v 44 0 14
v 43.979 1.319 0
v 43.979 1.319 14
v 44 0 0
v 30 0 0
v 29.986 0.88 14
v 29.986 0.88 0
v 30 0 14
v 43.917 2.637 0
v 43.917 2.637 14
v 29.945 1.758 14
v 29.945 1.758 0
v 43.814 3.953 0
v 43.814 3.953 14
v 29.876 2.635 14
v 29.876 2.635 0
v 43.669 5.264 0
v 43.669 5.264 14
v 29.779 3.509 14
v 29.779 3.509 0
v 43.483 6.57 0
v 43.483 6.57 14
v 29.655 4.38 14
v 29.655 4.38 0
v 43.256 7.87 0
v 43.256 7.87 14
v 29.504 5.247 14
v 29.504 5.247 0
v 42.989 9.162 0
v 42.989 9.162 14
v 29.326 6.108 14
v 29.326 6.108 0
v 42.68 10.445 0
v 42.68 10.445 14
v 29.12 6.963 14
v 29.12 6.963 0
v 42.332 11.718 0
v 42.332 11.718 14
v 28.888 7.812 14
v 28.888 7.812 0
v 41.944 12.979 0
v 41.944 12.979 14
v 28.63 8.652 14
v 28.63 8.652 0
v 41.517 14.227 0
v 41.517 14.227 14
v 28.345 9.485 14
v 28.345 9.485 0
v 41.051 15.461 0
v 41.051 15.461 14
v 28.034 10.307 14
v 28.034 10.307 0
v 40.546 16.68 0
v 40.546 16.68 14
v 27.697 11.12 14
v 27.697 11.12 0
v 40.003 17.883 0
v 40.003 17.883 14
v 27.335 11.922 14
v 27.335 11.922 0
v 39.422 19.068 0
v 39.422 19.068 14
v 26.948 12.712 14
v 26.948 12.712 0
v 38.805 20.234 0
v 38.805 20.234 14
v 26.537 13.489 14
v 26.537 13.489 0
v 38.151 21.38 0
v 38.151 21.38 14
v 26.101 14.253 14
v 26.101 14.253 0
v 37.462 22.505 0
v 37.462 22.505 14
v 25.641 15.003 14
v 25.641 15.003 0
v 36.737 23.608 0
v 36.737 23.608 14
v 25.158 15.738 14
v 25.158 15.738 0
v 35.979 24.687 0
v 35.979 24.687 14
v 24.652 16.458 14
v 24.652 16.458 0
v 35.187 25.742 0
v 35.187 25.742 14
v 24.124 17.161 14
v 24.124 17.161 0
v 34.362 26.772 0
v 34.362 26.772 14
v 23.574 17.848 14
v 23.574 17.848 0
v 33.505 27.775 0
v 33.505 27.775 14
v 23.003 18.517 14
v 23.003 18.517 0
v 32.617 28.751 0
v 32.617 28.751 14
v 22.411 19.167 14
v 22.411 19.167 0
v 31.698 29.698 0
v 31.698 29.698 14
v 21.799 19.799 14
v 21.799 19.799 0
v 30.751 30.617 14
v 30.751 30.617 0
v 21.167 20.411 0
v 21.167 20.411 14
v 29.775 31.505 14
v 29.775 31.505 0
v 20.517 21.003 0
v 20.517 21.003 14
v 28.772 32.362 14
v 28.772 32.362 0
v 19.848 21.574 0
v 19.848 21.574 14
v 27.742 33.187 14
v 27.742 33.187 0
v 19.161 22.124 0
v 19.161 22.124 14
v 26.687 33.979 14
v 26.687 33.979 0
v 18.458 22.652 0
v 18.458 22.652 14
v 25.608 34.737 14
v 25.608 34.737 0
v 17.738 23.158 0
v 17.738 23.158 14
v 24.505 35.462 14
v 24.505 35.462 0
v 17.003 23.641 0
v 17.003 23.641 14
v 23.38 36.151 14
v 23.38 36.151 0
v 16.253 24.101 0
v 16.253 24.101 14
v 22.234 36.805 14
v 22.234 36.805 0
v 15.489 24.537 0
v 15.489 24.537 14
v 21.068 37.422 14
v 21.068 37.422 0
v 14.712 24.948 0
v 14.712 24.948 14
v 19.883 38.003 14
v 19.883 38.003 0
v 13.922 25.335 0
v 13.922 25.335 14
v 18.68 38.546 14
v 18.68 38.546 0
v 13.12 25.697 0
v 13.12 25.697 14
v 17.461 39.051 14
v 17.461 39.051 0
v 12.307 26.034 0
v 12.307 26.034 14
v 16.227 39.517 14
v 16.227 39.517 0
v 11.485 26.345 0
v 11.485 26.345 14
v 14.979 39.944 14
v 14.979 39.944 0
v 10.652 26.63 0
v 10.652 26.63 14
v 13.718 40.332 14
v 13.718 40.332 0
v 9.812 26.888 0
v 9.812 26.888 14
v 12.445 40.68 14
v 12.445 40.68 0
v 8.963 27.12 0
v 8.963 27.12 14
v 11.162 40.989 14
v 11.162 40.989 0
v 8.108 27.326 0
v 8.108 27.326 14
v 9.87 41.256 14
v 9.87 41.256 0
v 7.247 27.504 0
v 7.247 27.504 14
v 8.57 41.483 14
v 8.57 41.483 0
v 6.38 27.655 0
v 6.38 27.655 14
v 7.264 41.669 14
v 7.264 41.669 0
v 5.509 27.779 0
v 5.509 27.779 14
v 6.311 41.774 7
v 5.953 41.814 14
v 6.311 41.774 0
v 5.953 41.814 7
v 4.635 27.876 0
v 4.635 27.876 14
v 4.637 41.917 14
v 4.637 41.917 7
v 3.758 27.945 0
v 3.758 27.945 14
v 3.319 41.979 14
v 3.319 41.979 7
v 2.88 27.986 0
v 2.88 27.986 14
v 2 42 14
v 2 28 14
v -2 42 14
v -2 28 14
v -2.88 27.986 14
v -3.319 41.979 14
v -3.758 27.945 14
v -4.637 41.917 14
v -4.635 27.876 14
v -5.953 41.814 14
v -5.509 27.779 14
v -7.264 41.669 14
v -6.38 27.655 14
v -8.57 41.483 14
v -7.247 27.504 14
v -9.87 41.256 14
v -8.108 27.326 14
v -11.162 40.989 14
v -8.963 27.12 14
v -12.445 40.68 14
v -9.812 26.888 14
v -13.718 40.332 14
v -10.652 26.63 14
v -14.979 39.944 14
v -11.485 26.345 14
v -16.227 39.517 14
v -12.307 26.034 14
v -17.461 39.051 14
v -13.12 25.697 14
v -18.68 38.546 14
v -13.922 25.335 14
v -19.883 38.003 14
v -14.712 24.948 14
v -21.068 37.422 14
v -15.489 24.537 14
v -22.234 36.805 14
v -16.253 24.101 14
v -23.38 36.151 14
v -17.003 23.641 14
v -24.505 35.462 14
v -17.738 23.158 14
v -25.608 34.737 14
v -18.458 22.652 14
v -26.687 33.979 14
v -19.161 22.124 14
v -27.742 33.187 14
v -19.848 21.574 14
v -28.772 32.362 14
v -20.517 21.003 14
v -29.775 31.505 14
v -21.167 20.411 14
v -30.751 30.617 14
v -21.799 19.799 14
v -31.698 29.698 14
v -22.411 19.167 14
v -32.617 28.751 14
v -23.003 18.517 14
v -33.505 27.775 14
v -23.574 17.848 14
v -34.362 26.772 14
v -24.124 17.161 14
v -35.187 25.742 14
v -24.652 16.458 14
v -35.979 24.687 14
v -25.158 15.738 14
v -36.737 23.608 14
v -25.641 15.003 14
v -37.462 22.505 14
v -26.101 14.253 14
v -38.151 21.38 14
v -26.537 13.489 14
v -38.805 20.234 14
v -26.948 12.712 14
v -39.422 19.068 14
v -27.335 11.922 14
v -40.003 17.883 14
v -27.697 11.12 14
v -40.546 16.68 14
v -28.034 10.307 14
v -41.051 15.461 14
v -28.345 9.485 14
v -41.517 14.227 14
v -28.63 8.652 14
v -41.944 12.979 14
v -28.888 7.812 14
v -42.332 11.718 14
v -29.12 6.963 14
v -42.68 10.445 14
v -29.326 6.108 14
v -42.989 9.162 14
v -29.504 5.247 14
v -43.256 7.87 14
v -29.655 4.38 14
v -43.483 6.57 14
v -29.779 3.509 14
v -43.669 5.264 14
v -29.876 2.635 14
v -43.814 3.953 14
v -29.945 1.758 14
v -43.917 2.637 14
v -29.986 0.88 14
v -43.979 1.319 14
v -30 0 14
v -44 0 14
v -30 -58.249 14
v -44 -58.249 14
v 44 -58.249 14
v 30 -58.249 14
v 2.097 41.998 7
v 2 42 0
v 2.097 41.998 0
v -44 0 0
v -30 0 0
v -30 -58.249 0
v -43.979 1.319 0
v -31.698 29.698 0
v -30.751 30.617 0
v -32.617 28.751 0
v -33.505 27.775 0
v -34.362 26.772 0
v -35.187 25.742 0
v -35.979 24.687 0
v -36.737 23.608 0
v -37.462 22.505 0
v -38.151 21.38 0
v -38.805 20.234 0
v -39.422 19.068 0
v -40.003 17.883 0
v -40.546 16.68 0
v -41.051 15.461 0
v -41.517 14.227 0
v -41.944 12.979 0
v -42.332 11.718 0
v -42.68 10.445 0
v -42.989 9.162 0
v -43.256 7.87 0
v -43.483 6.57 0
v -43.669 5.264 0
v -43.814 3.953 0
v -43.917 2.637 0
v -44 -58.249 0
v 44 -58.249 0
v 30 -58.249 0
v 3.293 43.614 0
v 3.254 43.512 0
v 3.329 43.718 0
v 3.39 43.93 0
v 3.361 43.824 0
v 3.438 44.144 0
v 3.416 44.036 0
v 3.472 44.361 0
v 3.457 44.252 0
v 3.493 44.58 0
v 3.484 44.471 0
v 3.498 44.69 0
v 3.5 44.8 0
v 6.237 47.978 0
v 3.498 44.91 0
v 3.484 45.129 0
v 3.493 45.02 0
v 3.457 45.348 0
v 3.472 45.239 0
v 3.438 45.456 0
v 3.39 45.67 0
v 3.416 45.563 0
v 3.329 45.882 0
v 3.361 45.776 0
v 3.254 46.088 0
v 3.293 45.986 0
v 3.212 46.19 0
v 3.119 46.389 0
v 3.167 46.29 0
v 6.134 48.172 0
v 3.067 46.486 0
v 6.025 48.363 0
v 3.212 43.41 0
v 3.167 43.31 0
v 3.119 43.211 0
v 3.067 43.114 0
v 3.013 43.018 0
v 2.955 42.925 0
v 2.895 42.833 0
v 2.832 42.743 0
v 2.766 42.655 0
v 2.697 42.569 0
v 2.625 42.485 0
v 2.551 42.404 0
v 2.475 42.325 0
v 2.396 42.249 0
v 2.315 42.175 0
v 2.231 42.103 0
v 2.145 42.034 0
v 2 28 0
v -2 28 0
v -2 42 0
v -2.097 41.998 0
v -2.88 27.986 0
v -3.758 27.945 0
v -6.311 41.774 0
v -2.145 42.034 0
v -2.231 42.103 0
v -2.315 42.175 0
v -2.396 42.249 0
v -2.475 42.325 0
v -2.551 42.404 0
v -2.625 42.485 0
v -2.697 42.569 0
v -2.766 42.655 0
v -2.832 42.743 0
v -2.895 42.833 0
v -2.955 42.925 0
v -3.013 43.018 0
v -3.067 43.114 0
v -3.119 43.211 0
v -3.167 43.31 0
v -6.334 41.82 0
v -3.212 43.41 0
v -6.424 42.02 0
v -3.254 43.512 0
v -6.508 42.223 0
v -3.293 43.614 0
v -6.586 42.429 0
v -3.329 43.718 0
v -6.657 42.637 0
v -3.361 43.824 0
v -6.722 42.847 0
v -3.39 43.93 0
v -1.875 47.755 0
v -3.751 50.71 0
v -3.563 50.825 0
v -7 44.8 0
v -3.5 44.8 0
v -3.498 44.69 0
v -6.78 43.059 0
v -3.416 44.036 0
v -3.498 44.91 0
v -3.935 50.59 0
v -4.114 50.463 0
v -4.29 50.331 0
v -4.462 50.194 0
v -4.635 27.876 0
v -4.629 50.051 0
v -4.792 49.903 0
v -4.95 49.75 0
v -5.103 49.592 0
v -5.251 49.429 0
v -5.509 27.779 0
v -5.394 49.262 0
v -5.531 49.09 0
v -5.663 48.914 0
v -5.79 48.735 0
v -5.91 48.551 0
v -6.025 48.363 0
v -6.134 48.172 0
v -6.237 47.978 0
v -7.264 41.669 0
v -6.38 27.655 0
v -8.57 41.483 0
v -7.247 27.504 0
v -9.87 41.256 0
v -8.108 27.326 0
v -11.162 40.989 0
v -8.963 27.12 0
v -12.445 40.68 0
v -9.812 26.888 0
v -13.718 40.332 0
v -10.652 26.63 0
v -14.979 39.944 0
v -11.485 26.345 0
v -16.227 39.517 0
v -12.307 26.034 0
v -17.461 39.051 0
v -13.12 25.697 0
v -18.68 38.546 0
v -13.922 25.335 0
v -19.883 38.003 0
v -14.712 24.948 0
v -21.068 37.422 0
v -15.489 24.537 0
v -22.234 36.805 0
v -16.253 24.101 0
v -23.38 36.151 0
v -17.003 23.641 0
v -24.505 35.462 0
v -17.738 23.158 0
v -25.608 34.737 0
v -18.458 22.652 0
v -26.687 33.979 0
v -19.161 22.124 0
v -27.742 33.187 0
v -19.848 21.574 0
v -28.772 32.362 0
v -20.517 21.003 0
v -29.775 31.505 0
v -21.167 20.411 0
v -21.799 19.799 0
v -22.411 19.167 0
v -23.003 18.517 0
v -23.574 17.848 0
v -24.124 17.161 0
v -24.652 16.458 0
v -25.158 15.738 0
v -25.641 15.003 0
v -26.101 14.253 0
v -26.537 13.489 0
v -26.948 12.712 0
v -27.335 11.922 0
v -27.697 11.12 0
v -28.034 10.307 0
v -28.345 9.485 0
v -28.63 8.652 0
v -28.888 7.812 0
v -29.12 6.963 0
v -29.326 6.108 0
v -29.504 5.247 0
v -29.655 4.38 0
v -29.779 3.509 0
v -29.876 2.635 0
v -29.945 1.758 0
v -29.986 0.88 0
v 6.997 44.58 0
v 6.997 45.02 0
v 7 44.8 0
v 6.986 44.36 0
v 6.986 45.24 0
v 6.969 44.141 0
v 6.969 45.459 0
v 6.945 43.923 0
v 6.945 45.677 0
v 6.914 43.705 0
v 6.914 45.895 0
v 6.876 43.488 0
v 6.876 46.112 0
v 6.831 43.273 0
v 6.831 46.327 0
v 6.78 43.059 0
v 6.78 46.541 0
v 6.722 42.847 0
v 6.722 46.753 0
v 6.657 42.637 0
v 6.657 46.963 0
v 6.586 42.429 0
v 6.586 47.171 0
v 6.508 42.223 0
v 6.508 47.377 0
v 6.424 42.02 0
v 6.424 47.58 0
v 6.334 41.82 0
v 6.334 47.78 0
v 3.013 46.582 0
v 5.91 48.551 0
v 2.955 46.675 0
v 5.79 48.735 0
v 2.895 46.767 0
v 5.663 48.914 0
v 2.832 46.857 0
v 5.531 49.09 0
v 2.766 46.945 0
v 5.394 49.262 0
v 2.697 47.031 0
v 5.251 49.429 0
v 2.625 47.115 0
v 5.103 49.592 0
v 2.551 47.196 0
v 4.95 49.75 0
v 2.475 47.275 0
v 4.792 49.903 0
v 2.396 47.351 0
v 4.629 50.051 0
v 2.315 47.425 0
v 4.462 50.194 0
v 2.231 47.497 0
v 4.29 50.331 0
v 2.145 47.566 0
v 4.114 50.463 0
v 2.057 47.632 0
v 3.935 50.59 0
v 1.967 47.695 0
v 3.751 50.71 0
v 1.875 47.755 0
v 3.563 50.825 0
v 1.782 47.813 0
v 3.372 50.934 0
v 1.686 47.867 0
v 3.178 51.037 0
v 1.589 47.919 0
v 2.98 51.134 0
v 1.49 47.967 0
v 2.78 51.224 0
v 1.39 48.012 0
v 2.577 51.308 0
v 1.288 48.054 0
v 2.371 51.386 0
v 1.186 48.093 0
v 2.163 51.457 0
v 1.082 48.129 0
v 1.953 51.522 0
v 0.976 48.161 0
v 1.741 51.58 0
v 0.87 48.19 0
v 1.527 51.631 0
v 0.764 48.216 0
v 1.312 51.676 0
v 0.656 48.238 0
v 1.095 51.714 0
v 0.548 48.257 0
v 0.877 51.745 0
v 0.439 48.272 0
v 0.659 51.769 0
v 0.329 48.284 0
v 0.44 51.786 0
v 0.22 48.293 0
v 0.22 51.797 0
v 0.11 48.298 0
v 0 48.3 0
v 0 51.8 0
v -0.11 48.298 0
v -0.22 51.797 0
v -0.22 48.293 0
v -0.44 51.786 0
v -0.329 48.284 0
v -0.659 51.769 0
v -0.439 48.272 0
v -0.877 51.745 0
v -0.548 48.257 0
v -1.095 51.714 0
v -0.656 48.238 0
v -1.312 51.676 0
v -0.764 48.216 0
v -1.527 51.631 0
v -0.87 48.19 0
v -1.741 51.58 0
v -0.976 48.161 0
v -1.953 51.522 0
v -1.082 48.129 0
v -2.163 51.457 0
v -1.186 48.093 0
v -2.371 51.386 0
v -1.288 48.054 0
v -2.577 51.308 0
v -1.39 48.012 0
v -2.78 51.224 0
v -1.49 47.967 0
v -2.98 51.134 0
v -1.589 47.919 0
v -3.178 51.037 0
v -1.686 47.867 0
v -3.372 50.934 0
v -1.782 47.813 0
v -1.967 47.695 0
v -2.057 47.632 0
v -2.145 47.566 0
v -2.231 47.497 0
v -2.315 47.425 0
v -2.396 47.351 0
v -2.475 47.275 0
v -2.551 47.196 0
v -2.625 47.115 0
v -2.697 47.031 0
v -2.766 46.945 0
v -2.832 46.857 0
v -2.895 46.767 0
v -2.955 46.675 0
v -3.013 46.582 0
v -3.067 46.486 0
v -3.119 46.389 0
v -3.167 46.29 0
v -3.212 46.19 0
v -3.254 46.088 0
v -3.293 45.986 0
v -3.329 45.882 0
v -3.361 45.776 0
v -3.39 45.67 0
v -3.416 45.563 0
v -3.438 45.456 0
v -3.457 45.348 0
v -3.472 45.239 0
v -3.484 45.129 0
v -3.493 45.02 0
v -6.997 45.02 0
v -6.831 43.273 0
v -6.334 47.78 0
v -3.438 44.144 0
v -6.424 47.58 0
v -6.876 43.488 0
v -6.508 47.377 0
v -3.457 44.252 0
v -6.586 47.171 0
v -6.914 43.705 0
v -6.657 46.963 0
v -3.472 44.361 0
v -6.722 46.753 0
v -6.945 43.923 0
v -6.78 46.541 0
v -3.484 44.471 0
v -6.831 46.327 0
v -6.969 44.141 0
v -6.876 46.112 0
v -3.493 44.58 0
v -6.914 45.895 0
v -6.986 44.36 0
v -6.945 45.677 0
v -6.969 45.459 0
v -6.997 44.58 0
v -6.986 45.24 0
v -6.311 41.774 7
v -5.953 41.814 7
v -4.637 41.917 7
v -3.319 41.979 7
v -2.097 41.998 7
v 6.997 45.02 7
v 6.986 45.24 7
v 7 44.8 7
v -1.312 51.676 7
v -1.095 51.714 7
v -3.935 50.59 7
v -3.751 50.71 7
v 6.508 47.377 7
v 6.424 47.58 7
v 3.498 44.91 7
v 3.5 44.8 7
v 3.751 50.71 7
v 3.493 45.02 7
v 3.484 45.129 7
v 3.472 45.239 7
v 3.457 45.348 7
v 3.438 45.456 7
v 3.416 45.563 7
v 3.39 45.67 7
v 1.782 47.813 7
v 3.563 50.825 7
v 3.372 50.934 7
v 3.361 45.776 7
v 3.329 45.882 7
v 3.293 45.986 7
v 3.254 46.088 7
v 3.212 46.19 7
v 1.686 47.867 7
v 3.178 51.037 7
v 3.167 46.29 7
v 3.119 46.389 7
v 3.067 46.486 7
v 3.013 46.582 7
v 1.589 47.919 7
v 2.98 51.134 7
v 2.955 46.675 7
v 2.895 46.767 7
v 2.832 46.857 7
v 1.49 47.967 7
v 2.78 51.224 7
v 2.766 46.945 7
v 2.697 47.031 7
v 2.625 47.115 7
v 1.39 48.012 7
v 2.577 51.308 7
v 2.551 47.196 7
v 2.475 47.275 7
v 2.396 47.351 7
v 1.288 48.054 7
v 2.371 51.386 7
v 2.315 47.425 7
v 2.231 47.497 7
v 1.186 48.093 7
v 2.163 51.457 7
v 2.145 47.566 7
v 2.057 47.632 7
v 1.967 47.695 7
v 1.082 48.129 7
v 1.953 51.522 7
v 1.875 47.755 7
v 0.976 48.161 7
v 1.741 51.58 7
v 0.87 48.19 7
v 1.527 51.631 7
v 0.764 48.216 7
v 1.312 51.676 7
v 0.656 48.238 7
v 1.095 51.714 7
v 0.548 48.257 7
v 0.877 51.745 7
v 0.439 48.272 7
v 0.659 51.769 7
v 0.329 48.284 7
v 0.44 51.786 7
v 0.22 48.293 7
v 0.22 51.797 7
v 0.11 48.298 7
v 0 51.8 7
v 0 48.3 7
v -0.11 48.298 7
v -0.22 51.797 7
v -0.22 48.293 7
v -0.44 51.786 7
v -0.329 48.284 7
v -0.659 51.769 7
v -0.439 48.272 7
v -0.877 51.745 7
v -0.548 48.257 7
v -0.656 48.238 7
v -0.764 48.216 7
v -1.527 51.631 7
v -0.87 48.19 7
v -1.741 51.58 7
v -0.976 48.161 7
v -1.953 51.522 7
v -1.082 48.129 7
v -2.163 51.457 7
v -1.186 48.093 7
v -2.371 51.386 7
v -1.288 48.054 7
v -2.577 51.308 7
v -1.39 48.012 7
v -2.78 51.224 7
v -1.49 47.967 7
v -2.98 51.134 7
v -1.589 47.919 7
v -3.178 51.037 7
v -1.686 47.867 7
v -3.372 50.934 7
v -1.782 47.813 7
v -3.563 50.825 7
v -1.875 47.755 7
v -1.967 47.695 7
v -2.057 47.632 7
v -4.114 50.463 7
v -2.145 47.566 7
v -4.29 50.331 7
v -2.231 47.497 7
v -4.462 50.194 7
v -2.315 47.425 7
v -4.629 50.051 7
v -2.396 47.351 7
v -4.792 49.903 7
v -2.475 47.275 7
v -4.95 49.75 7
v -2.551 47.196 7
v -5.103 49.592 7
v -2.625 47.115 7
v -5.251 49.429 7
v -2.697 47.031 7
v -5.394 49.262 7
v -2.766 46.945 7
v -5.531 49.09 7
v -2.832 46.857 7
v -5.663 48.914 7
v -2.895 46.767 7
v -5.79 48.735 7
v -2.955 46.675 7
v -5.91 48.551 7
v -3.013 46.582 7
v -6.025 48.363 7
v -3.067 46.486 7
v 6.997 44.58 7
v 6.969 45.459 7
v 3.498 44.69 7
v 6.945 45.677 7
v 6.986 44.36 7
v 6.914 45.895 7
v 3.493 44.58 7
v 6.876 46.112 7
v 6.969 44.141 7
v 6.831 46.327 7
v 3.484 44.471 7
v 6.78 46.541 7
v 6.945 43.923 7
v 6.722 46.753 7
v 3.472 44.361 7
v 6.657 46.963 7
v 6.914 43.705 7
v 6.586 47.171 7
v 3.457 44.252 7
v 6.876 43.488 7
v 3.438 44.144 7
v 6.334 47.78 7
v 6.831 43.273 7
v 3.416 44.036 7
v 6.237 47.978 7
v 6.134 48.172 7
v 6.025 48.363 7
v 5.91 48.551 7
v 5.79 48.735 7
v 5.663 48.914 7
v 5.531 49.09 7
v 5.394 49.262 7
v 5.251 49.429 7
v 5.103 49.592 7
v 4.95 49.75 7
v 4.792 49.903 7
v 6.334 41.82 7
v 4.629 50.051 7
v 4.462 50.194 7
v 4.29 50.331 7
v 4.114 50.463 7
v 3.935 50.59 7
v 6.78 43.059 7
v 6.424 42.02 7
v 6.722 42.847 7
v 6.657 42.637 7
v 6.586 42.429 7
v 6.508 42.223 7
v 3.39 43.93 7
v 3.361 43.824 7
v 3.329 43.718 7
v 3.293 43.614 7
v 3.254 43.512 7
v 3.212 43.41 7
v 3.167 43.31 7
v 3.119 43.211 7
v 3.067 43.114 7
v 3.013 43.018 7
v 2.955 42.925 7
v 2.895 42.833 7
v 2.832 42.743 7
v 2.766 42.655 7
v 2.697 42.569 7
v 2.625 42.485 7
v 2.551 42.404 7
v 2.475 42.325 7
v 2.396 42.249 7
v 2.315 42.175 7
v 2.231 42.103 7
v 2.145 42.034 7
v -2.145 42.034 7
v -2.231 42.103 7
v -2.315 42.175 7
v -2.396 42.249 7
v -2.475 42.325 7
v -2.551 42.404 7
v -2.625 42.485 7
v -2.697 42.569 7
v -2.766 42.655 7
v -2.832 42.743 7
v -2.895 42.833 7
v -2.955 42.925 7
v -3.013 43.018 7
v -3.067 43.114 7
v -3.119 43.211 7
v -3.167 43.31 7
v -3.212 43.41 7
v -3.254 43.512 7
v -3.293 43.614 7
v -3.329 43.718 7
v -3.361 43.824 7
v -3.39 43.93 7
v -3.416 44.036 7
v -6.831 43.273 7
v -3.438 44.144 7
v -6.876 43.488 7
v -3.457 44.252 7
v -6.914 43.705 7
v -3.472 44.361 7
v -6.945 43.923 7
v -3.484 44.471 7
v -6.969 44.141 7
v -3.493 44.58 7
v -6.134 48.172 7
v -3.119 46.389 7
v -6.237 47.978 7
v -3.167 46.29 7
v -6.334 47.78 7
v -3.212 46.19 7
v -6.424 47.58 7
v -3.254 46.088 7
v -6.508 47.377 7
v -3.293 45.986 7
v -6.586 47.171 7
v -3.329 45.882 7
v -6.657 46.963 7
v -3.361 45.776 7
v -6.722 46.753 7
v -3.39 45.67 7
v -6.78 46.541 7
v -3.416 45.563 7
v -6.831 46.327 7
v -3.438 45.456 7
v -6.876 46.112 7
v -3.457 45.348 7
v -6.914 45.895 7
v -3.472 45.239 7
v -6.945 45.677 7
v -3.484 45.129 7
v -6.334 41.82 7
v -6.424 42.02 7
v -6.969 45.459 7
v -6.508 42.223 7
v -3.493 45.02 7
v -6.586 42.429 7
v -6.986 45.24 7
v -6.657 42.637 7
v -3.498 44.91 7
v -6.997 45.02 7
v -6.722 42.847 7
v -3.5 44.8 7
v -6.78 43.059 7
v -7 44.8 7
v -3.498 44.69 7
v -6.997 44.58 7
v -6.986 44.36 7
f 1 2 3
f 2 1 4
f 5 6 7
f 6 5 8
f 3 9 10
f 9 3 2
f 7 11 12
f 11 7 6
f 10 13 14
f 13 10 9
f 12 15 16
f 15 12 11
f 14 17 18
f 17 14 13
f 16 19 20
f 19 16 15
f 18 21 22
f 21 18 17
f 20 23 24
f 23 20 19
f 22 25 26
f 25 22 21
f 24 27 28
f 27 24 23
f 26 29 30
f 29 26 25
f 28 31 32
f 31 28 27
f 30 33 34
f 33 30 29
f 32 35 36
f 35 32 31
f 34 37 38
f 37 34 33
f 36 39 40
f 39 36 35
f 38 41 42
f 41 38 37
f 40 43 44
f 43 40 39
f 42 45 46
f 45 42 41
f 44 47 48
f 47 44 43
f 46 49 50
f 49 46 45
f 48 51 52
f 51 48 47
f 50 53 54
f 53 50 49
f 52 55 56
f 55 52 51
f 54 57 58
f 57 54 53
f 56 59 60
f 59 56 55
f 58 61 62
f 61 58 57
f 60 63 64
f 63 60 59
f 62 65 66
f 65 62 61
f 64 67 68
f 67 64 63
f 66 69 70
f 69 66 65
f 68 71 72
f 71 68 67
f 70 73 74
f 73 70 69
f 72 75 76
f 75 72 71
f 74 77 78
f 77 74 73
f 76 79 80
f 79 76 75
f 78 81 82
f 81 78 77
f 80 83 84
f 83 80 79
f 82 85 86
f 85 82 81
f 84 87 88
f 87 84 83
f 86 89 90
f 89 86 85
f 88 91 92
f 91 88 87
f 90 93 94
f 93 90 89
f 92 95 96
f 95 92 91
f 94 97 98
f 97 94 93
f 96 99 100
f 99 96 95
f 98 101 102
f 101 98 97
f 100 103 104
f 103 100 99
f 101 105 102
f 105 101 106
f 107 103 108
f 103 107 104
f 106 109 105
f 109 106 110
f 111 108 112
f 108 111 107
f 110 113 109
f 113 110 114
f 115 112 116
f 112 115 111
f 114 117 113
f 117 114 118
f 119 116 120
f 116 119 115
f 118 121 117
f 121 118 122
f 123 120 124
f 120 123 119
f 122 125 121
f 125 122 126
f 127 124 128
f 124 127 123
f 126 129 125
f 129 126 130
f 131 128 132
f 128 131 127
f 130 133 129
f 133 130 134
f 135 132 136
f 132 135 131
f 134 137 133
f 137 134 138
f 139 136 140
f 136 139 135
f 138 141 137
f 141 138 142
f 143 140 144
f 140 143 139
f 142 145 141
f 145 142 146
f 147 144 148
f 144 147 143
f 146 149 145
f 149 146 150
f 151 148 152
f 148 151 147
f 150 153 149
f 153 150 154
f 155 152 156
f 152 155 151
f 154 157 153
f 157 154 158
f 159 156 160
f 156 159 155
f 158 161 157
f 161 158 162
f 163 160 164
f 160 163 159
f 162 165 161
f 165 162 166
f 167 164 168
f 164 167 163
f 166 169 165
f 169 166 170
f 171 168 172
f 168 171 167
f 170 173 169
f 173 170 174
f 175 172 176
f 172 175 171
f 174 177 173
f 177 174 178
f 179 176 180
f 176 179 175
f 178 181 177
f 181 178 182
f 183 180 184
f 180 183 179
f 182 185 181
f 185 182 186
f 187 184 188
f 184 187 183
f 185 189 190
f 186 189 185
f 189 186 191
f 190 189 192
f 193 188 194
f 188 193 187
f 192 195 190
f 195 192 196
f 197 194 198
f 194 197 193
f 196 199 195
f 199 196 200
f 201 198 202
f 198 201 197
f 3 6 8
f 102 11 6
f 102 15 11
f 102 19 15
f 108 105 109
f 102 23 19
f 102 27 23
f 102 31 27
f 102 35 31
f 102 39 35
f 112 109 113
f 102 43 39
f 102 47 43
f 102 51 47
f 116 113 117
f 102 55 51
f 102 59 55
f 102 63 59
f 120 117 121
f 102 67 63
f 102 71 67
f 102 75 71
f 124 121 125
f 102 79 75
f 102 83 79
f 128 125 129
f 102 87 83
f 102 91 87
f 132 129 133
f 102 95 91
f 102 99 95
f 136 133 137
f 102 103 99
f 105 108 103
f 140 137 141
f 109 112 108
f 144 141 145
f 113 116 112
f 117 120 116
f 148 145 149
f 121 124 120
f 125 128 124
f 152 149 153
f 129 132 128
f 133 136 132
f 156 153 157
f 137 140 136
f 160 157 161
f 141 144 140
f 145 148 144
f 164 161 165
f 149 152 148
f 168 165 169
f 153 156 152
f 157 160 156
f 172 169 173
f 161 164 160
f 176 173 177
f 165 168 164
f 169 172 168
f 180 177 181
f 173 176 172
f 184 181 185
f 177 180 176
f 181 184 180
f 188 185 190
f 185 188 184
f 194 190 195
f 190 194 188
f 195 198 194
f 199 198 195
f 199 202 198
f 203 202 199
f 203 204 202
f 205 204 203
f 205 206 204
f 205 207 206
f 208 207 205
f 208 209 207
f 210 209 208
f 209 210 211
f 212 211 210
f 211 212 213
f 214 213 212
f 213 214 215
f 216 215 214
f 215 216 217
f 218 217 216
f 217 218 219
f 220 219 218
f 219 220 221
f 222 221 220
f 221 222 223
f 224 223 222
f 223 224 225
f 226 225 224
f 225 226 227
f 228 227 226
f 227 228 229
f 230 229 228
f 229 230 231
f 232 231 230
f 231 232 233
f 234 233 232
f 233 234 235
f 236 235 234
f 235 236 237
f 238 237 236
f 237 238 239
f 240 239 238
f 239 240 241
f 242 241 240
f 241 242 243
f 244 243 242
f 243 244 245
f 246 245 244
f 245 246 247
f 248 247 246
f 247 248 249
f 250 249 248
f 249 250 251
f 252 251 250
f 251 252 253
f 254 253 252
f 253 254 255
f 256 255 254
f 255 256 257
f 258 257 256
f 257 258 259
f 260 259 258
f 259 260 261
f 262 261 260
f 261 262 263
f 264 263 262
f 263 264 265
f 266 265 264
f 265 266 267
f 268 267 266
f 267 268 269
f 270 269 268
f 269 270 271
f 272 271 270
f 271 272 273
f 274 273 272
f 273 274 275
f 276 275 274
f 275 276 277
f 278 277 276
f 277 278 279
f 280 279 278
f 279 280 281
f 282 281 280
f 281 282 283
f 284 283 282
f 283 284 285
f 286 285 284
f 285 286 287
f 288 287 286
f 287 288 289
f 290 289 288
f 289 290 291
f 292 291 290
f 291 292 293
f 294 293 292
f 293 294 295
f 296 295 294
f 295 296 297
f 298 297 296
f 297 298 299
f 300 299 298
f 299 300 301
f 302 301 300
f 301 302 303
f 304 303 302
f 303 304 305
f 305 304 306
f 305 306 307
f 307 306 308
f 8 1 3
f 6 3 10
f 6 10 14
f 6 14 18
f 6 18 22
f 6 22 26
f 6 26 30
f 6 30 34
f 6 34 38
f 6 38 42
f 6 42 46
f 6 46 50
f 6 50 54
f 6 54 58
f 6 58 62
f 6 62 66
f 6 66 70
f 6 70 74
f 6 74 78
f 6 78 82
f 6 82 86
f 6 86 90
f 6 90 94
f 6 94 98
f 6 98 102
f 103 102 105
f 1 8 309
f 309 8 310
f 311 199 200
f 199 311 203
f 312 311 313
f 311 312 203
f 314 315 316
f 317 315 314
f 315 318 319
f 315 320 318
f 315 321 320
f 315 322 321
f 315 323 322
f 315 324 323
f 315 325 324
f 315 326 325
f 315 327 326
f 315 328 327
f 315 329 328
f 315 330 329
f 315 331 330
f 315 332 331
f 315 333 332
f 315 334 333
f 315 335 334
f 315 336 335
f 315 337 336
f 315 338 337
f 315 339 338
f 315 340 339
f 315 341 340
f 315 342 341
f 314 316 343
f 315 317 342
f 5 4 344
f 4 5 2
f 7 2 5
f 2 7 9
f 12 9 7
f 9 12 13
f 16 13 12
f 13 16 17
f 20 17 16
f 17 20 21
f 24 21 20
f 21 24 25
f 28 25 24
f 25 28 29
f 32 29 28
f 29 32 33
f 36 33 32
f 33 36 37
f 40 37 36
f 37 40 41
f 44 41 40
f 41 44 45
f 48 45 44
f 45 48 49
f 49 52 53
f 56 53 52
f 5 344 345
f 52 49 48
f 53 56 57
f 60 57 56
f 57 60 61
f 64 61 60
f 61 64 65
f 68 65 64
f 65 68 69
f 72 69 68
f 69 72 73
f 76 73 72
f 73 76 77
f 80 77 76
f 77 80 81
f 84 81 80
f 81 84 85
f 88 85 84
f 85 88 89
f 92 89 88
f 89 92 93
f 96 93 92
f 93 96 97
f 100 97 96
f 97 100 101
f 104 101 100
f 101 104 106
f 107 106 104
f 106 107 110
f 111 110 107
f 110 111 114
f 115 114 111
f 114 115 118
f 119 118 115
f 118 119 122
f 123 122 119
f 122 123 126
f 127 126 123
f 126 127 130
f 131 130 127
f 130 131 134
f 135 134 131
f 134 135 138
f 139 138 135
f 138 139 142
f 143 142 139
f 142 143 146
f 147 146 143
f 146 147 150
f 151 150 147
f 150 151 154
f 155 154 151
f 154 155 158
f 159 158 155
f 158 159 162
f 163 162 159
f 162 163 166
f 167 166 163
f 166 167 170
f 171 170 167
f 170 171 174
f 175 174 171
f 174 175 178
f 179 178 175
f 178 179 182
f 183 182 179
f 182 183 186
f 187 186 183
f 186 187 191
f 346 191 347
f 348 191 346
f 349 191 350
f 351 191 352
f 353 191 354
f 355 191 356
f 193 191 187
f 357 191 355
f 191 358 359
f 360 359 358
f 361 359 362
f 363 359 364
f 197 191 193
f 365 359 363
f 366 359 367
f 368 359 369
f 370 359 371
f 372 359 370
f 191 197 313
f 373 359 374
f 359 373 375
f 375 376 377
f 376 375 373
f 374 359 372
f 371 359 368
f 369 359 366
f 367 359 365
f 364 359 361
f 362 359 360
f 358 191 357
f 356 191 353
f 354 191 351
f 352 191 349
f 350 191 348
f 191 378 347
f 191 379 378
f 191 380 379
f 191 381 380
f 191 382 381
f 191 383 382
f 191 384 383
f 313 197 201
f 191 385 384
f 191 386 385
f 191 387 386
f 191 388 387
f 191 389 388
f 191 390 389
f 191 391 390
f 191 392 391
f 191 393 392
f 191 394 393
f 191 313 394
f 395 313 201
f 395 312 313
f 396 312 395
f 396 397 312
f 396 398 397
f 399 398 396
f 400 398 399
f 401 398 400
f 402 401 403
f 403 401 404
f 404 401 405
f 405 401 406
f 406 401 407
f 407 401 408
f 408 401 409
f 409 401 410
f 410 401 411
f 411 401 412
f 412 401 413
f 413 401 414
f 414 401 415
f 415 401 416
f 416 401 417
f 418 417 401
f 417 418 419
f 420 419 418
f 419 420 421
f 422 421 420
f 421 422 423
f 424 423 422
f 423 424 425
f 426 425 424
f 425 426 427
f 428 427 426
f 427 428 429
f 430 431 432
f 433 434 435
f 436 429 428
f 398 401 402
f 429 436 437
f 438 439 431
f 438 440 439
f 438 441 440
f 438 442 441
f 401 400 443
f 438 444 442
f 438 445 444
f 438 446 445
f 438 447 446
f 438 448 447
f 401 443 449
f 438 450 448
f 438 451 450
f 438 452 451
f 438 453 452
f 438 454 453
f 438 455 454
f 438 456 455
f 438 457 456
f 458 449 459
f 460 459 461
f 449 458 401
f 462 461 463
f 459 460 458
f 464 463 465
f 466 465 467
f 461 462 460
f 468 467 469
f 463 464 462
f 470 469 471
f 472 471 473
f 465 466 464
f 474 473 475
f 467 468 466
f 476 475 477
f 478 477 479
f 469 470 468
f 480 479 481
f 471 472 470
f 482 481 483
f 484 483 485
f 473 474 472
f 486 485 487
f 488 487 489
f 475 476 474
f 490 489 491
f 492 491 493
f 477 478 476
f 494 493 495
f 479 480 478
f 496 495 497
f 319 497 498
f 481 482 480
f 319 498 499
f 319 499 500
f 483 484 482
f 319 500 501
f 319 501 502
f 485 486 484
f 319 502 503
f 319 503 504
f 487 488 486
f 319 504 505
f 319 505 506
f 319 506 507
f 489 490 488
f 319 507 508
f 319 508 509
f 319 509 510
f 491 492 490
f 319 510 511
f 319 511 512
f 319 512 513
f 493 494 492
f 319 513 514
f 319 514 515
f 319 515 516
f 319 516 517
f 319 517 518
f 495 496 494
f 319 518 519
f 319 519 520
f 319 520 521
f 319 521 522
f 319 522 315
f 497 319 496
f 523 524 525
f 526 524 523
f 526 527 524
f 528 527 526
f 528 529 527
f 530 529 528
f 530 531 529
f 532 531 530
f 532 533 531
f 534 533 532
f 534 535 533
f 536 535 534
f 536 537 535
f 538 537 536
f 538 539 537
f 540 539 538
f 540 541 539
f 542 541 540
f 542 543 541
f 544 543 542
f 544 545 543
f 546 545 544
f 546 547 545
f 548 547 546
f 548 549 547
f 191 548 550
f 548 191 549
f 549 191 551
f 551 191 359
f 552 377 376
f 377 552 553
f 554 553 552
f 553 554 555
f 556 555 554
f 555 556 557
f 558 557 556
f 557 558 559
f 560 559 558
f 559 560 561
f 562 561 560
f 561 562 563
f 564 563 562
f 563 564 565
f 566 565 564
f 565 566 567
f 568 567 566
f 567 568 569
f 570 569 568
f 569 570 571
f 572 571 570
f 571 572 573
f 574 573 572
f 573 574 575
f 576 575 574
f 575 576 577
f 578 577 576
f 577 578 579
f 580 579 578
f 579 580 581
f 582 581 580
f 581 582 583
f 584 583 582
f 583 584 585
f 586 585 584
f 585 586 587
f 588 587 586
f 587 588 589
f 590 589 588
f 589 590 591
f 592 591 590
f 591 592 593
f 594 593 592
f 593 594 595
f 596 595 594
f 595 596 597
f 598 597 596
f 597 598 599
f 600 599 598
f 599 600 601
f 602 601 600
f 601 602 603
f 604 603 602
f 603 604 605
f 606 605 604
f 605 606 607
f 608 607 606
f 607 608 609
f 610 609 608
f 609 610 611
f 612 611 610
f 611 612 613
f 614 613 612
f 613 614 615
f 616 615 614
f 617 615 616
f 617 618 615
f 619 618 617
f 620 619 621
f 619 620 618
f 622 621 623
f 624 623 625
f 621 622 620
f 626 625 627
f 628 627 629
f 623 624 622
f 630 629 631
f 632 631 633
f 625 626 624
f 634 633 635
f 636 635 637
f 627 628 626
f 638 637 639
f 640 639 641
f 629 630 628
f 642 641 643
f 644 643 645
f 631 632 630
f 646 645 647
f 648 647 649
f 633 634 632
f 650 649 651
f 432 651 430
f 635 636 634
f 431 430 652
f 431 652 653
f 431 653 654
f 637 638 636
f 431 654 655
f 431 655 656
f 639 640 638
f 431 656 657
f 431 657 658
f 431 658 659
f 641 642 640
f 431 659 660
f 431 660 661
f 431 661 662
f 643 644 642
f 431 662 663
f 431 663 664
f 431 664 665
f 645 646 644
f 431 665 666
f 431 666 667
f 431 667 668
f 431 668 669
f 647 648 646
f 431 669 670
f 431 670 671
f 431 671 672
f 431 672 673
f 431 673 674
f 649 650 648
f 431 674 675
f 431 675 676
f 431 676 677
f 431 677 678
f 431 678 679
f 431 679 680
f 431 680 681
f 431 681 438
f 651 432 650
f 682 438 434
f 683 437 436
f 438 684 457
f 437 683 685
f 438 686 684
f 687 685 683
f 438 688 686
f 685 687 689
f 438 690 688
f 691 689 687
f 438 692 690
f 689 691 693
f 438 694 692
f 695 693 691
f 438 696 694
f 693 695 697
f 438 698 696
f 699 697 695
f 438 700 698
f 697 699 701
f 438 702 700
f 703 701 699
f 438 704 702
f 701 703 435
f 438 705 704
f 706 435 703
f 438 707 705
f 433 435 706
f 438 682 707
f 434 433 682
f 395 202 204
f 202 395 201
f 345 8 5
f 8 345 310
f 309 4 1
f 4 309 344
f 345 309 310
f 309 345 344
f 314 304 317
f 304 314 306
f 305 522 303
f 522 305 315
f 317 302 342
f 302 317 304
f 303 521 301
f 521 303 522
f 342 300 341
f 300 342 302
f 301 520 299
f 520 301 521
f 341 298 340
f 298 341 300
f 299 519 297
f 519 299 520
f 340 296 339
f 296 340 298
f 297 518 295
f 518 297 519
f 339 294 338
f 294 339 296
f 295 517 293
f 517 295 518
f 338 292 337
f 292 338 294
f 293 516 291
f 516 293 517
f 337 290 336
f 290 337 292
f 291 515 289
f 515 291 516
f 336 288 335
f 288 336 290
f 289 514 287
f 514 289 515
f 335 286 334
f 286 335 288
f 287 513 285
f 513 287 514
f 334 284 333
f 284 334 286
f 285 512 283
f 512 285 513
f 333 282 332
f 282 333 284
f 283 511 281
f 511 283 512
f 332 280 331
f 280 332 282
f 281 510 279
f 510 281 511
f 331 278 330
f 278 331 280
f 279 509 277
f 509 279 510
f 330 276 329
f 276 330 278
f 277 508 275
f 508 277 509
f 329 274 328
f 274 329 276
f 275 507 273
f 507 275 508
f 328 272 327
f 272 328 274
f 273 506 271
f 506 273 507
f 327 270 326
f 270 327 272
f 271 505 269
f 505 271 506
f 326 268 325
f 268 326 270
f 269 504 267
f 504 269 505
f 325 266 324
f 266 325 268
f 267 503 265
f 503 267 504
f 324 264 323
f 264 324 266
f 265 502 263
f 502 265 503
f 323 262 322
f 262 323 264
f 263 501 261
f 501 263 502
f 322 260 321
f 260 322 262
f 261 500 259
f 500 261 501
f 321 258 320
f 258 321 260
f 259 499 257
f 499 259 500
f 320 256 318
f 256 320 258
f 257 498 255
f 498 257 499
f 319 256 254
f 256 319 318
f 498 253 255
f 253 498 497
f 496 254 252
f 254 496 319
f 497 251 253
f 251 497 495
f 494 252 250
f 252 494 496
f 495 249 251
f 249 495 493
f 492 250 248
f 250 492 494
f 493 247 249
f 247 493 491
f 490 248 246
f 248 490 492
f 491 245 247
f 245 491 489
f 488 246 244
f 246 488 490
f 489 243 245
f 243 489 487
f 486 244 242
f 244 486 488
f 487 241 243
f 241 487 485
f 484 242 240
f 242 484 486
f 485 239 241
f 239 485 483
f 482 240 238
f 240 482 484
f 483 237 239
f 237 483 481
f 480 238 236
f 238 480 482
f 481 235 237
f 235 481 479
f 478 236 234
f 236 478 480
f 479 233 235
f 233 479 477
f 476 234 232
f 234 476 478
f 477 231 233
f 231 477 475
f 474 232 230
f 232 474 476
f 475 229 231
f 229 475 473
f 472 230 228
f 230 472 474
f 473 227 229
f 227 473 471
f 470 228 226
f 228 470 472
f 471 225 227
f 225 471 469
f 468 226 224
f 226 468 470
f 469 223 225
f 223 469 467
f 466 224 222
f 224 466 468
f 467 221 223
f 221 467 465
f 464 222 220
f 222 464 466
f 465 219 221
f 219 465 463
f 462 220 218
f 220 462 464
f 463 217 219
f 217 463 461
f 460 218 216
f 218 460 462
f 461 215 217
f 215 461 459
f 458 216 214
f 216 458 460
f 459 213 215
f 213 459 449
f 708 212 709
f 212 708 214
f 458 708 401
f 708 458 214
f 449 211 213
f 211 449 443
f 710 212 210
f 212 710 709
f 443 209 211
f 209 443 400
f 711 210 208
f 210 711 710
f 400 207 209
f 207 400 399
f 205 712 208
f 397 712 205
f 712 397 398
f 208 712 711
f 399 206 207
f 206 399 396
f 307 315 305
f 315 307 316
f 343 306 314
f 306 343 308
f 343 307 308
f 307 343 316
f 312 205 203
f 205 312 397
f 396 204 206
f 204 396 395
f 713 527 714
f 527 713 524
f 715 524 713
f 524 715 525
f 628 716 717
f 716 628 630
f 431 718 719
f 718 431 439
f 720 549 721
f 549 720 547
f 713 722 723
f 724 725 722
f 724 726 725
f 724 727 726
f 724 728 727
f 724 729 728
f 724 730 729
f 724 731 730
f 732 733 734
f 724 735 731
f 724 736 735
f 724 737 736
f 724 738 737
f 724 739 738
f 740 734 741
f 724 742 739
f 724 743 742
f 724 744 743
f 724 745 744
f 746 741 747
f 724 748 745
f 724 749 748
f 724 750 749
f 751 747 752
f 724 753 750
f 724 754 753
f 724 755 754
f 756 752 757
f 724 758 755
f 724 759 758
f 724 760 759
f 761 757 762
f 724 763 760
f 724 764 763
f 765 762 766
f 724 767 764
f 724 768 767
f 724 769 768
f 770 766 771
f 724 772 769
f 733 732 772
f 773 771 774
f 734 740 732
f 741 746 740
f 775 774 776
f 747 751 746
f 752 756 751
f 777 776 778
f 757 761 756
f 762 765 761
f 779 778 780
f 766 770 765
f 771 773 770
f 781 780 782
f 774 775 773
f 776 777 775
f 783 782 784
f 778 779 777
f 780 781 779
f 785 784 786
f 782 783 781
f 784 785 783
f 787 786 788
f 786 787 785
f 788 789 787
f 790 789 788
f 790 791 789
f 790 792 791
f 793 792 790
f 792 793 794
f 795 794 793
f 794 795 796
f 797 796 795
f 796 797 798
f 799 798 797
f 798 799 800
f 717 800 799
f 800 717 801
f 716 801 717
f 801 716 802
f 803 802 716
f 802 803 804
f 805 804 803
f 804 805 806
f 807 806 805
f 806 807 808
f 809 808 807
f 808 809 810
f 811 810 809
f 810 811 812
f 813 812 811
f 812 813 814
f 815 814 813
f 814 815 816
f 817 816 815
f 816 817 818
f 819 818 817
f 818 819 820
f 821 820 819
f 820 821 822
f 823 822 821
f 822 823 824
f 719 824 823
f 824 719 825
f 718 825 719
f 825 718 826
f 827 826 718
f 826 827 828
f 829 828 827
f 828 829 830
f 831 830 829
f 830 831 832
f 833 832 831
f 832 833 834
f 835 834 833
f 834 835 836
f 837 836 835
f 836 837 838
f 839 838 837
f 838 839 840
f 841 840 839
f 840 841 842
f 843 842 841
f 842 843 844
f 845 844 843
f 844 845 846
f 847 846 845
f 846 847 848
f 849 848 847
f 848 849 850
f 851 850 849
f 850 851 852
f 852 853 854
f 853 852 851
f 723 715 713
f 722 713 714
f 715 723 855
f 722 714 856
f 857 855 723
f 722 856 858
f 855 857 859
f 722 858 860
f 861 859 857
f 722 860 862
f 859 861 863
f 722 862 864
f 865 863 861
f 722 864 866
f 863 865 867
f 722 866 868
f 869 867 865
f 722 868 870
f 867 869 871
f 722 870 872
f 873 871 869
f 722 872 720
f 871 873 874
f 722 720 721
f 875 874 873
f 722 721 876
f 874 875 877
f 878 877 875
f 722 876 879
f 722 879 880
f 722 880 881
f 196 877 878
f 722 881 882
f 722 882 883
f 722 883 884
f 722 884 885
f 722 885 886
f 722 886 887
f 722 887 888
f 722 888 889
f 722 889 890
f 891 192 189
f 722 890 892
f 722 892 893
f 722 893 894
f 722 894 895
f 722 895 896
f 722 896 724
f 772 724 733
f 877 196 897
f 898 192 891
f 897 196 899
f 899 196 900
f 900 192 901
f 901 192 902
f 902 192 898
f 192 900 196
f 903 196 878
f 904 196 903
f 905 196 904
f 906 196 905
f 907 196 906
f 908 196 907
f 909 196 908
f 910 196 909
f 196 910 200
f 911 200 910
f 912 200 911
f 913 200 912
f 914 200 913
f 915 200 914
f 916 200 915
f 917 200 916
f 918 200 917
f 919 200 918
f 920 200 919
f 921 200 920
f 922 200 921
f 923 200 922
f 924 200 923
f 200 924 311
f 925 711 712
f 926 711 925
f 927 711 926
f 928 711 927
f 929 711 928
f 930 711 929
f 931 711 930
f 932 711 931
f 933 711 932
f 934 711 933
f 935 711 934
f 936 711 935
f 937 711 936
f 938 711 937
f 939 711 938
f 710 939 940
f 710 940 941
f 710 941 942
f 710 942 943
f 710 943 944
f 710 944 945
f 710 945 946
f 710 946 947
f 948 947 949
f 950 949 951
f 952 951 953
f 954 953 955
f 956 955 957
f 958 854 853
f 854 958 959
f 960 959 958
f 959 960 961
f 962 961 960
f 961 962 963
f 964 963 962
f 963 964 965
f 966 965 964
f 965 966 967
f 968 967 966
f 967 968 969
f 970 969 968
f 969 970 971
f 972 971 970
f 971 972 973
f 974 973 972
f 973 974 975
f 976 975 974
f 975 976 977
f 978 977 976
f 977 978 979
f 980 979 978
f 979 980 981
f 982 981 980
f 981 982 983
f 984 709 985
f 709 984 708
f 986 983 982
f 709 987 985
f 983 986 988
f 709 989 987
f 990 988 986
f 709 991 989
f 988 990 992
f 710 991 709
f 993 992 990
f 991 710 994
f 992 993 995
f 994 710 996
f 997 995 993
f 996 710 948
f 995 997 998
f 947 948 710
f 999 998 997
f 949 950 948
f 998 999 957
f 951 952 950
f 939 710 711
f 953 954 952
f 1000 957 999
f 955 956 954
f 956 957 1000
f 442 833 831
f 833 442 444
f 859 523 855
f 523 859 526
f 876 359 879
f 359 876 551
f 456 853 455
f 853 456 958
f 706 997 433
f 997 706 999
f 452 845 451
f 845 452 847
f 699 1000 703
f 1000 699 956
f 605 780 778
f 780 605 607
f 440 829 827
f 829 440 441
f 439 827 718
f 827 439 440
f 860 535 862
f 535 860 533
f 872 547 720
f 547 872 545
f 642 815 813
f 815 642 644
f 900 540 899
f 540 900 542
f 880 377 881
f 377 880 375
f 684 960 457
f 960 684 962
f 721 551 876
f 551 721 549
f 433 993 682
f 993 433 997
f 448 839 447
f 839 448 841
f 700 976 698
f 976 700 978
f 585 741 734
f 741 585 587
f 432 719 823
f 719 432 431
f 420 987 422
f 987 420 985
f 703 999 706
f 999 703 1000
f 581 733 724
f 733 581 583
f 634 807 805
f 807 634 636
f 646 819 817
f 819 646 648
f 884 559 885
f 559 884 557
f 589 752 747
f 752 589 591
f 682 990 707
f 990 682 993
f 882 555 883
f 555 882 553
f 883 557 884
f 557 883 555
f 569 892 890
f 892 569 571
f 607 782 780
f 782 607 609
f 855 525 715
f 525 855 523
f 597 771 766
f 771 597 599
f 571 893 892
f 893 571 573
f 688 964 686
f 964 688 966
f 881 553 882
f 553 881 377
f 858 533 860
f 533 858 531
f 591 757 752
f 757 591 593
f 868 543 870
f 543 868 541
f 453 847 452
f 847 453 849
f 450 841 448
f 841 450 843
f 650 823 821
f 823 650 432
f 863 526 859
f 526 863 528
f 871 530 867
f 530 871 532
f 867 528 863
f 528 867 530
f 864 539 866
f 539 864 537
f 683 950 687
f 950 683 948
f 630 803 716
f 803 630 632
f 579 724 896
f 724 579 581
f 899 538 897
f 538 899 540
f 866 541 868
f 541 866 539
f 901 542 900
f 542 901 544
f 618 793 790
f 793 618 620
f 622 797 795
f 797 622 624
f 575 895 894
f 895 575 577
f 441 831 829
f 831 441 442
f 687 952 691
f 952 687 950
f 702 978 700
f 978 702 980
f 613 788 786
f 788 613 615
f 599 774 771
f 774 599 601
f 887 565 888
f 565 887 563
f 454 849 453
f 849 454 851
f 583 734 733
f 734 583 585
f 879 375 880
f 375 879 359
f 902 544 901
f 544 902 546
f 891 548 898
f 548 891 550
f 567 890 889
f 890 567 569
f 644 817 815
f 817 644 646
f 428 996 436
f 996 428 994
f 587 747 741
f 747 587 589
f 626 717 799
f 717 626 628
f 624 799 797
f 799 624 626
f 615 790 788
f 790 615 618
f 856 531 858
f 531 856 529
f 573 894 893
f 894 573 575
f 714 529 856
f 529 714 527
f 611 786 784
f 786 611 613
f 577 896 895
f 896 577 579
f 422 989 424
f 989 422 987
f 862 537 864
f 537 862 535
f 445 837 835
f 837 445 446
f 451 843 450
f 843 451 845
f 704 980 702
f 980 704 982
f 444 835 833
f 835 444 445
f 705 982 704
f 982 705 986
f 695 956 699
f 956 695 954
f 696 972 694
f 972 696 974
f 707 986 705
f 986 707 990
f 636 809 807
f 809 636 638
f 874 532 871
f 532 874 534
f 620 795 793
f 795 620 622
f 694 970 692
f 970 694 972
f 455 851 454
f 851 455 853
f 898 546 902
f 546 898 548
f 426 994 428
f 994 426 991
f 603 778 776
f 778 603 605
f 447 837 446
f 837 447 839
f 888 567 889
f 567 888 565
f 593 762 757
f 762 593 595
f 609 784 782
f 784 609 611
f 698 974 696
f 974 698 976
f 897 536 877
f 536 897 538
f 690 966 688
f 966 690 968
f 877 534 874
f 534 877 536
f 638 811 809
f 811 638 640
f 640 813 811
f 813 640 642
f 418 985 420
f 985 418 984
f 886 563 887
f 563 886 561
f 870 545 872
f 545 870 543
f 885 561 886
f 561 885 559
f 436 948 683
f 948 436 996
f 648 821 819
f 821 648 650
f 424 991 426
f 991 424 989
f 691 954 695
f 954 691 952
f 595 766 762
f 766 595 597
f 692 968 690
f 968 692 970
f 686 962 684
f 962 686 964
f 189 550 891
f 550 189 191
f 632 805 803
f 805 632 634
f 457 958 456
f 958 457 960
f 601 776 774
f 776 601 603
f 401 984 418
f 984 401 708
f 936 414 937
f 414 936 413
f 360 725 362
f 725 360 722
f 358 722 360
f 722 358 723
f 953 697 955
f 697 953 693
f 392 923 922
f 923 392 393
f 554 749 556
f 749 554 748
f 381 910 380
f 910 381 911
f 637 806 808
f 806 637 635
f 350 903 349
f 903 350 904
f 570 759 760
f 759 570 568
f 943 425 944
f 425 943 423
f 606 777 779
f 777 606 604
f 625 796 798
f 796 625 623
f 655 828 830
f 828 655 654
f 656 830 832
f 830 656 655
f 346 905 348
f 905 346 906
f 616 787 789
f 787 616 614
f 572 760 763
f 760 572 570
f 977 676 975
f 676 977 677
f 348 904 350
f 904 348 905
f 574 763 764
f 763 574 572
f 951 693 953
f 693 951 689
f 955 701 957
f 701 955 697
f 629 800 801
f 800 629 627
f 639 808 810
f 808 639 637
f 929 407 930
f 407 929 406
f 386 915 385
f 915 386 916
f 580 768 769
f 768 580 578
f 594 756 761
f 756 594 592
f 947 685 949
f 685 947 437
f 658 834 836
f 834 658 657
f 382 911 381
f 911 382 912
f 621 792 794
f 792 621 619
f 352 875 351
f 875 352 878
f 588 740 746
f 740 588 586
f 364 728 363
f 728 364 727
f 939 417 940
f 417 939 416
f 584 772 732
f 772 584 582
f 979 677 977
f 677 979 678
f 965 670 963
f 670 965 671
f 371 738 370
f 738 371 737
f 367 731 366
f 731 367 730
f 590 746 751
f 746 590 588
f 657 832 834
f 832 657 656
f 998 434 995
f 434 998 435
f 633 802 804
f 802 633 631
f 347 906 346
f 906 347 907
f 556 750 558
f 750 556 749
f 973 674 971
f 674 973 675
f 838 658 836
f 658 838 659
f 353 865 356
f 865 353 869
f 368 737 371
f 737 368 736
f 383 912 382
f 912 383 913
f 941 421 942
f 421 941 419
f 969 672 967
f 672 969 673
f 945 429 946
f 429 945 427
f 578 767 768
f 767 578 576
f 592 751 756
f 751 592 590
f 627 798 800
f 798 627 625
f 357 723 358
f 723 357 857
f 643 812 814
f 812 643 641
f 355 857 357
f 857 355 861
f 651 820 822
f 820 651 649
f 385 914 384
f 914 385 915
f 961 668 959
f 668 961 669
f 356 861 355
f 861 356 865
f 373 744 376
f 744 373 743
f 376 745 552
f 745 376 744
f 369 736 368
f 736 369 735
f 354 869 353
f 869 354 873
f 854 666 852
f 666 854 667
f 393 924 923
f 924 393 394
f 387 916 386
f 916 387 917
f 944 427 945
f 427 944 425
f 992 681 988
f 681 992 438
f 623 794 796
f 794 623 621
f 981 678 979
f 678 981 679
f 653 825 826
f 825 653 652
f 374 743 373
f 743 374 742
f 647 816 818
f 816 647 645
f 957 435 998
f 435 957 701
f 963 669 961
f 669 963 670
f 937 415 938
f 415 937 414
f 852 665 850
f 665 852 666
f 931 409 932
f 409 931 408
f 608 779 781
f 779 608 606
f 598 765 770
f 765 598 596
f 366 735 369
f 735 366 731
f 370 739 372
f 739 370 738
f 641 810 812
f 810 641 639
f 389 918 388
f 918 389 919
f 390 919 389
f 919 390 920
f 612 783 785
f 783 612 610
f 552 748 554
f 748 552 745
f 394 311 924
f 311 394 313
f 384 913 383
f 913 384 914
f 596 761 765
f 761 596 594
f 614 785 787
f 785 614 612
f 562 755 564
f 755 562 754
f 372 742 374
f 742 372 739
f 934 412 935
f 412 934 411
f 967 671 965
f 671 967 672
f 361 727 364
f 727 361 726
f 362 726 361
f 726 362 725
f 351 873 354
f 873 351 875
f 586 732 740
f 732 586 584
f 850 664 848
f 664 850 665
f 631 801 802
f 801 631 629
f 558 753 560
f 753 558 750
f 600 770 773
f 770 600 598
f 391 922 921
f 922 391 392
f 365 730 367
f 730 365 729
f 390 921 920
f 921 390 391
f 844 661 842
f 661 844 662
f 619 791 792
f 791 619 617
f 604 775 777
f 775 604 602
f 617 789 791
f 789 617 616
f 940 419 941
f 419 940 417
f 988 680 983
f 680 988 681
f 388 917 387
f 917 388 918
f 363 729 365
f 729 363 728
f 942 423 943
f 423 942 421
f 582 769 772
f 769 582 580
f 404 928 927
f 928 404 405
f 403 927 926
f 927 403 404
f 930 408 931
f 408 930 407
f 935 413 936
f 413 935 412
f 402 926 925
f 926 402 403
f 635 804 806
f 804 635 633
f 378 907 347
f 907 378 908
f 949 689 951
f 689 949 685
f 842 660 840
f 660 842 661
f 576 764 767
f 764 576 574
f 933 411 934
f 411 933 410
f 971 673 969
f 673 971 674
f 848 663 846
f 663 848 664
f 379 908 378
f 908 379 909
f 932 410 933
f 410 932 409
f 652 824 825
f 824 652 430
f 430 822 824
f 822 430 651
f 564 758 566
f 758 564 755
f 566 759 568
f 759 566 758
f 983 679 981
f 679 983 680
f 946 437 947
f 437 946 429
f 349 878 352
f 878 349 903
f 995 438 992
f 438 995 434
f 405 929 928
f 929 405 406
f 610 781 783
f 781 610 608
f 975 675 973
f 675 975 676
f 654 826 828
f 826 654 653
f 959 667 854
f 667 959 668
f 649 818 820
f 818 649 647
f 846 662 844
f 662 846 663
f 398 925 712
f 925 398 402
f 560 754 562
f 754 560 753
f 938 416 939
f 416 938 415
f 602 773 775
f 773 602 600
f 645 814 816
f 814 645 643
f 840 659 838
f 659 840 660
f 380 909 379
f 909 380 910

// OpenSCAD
side = 14;
//need to remove the space used for teh bend and the sides
lenght = 60-4 * side;

height = 9 * 1.61803398 * lenght ;

$fn  = 200;


module side(){
//translate([0,60,0])
//   rotate_extrude(angle=270, convexity=10)
//       translate([40, 0]) circle(10);
rotate_extrude(angle=90, convexity=10)
   translate([2 * side, 0]) square(side);
//translate([20,0,0]) 
//   rotate([90,0,0]) cylinder(r=10,h=80);
translate([2 * side,0,0])rotate([90,0,0])cube([side,side,height],false);
}

module horseShoe(){
side();
translate([-lenght,0,0])mirror([1,0,0])side();

translate([-lenght,2 * side,side])rotate([0,90,0])cube([side,side,lenght],false);
}

translate([lenght/2,0,0])horseShoe();

translate([0,3.2 * side,0])difference(){
cylinder(h=side/2, r=side/2, center=false);
cylinder(h = 2 * side, r=side/4, center=false);
}

//Measure to ensure it fits the door, change the value of h to the desired one
//translate([0,0,2*side])rotate([0,90,0])cylinder(h = 60, r=side/4, center=true);
